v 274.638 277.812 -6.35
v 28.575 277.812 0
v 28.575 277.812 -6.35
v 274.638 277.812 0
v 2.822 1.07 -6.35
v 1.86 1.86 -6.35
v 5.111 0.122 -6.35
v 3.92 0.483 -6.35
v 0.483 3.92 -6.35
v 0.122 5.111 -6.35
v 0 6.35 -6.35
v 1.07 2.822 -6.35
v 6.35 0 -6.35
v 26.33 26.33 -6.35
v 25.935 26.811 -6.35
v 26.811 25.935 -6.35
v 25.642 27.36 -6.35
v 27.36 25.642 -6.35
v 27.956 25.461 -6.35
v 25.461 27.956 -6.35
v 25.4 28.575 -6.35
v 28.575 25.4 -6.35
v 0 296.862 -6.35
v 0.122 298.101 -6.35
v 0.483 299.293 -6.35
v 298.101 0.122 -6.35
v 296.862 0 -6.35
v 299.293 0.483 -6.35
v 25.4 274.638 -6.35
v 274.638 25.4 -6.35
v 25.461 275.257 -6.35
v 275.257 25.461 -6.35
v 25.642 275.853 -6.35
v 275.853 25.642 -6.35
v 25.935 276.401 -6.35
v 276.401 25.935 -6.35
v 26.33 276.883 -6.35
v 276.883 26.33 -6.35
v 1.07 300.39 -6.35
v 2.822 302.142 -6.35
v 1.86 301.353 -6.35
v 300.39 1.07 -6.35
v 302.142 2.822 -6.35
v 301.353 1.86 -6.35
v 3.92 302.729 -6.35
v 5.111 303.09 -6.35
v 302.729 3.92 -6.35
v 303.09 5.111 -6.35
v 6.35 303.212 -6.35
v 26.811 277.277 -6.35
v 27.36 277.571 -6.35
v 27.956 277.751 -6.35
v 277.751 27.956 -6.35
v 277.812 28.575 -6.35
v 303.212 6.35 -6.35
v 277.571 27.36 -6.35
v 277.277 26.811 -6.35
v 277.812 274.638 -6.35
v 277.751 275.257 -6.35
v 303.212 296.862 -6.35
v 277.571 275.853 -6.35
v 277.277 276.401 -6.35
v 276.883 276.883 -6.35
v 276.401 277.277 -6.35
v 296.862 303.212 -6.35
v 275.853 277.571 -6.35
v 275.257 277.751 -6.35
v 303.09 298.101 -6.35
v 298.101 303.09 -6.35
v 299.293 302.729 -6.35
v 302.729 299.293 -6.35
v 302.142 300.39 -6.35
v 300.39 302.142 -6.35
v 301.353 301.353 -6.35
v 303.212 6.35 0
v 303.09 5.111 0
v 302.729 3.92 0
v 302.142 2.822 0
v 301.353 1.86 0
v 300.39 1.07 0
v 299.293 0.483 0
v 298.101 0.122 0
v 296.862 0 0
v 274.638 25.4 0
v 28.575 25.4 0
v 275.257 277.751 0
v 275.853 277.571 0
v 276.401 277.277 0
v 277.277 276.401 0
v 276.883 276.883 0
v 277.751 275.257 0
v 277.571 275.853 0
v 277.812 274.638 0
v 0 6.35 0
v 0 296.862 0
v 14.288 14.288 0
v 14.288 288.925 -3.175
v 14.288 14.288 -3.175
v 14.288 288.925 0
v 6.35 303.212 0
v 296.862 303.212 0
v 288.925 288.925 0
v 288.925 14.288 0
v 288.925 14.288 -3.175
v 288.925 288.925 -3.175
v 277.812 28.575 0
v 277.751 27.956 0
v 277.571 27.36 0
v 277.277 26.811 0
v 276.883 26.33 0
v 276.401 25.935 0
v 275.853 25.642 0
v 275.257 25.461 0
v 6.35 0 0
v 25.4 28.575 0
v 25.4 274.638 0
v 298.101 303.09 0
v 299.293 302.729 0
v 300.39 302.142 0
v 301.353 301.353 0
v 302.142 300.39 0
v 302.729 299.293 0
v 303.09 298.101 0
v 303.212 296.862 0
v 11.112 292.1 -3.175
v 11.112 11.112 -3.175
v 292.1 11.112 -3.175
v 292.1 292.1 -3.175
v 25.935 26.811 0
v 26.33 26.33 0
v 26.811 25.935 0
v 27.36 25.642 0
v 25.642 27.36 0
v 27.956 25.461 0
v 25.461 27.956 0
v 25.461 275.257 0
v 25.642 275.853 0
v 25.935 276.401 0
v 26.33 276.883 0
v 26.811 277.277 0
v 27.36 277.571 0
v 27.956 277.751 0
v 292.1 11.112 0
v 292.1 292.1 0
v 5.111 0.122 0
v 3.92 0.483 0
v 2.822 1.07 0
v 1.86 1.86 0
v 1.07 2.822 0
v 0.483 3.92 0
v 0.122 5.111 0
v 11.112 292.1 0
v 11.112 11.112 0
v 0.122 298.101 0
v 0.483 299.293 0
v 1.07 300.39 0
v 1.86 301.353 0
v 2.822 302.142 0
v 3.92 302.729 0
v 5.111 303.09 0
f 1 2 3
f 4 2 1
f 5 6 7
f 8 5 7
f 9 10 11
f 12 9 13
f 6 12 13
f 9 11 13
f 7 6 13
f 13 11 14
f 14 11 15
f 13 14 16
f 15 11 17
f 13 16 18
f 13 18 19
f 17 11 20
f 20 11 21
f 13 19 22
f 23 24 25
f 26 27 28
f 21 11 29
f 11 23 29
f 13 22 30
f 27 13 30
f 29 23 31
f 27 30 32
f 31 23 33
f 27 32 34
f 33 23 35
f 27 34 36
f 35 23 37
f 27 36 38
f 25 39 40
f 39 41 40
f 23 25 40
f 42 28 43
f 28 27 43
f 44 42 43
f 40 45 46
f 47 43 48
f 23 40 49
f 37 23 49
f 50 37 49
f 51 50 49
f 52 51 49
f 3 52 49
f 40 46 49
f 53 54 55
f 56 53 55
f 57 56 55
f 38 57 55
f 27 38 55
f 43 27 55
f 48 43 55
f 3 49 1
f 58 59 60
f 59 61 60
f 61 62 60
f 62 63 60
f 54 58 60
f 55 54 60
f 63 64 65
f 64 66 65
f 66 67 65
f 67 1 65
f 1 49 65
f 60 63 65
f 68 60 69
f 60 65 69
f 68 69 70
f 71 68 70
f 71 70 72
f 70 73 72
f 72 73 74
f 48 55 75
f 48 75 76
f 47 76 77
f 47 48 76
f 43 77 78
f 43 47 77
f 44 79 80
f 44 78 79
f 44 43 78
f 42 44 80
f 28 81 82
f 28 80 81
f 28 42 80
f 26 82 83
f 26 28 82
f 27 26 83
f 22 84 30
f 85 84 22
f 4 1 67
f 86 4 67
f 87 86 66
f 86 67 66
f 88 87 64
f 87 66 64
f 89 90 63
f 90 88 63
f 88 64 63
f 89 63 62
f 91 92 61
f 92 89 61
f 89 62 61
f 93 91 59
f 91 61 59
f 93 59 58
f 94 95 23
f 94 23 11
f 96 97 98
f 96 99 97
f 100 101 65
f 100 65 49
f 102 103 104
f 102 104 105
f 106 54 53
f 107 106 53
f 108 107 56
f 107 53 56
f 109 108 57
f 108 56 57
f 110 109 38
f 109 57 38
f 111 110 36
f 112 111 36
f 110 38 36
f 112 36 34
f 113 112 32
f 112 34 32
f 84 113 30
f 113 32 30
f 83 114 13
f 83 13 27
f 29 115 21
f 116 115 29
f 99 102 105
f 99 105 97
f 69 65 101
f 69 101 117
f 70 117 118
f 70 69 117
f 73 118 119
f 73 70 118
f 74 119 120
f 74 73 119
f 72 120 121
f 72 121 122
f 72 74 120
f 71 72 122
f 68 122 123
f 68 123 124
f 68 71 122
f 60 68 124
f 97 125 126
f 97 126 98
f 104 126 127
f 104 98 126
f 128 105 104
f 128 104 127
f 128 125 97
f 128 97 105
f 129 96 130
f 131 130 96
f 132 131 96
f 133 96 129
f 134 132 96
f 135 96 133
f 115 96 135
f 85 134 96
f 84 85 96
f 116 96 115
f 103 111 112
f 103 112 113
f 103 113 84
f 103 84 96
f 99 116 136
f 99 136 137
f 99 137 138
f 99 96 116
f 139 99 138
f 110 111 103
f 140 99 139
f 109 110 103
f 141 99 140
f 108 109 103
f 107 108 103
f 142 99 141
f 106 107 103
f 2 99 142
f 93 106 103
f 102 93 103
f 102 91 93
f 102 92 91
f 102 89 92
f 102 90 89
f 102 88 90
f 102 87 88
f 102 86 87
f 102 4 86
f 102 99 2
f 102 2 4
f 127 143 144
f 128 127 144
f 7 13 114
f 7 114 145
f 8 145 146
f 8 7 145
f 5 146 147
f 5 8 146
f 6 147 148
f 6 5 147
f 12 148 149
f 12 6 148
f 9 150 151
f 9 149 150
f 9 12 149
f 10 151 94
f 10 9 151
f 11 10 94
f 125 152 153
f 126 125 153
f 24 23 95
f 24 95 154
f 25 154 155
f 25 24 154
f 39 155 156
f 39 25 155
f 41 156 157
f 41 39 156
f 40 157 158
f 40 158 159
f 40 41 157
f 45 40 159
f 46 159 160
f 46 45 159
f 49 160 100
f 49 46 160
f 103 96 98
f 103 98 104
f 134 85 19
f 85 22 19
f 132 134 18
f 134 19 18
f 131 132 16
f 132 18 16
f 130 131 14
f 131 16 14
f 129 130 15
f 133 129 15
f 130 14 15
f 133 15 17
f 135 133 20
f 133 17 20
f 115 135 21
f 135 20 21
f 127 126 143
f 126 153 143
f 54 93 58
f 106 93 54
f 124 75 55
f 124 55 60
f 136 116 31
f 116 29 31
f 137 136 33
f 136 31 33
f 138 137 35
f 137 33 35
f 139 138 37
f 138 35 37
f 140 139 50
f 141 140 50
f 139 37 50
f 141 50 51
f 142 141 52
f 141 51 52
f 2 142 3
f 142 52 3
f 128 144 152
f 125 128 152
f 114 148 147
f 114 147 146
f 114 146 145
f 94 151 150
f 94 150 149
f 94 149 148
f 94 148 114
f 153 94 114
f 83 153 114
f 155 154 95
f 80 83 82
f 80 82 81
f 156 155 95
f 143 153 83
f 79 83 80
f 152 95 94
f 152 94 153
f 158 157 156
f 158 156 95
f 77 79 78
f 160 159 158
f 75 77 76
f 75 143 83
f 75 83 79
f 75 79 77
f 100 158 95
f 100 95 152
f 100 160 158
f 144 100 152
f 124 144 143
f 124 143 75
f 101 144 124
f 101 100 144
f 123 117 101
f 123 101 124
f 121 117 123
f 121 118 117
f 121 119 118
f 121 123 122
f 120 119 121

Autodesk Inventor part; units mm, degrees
ref_plane "YZ Plane" through (0, 0, 0) normal (1, 0, 0) x (0, 1, 0)
ref_plane "XZ Plane" through (0, 0, 0) normal (0, 1, 0) x (-1, 0, 0)
ref_plane "XY Plane" through (0, 0, 0) normal (0, 0, 1) x (1, 0, 0)
sketch "Sketch1" plane through (0, 0, 0) normal (0, 0, 1) x (1, 0, 0)
  line L0 (0, 0) -> (303.2125, 0)
  line L1 (303.2125, 0) -> (303.2125, 303.2125)
  line L2 (303.2125, 303.2125) -> (0, 303.2125)
  line L3 (0, 303.2125) -> (0, 0)
  line L4 (25.4, 277.8125) -> (277.8125, 277.8125)
  line L5 (277.8125, 277.8125) -> (277.8125, 25.4)
  line L6 (277.8125, 25.4) -> (25.4, 25.4)
  line L7 (25.4, 25.4) -> (25.4, 277.8125)
  line L8 (25.4, 151.6062) -> (277.8125, 151.6063)
  line L9 (151.6062, 277.8125) -> (151.6062, 25.4)
  line L10 (292.1, 292.1) -> (11.1125, 292.1)
  line L11 (11.1125, 292.1) -> (11.1125, 11.1125)
  line L12 (11.1125, 11.1125) -> (292.1, 11.1125)
  line L13 (292.1, 11.1125) -> (292.1, 292.1)
  line L14 (288.925, 288.925) -> (14.2875, 288.925)
  line L15 (14.2875, 288.925) -> (14.2875, 14.2875)
  line L16 (14.2875, 14.2875) -> (288.925, 14.2875)
  line L17 (288.925, 14.2875) -> (288.925, 288.925)
  dimension "d0" = 303.2125
  dimension "d19" = 25.4
  dimension "d20" = 25.4
  dimension "d21" = 25.4
  dimension "d22" = 25.4
  dimension "d37" = 3.175
  dimension "d39" = 11.1125
  dimension "d40" = 11.1125
extrude "Extrusion1" add sketch "Sketch1" against normal blind 6.35 contours L3 L2 L1 L0 | L13 L12 L11 L10 | L17 L16 L15 L14
extrude "Extrusion2" cut sketch "Sketch1" against normal blind 3.175 contours L13 L12 L11 L10
fillet "Fillet1" radius 6.35 4 edges at (0, 303.2125, -3.175) (303.2125, 303.2125, -3.175) (0, 0, -3.175) (303.2125, 0, -3.175)
fillet "Fillet1" radius 3.175 4 edges at (277.8125, 25.4, -3.175) (277.8125, 277.8125, -3.175) (25.4, 277.8125, -3.175) (25.4, 25.4, -3.175)
equation "\"d20\" = d19"
equation "\"d21\" = d19"
equation "\"d22\" = d20"
equation "\"d39\" = d40"
properties material "Wood (Birch)"
